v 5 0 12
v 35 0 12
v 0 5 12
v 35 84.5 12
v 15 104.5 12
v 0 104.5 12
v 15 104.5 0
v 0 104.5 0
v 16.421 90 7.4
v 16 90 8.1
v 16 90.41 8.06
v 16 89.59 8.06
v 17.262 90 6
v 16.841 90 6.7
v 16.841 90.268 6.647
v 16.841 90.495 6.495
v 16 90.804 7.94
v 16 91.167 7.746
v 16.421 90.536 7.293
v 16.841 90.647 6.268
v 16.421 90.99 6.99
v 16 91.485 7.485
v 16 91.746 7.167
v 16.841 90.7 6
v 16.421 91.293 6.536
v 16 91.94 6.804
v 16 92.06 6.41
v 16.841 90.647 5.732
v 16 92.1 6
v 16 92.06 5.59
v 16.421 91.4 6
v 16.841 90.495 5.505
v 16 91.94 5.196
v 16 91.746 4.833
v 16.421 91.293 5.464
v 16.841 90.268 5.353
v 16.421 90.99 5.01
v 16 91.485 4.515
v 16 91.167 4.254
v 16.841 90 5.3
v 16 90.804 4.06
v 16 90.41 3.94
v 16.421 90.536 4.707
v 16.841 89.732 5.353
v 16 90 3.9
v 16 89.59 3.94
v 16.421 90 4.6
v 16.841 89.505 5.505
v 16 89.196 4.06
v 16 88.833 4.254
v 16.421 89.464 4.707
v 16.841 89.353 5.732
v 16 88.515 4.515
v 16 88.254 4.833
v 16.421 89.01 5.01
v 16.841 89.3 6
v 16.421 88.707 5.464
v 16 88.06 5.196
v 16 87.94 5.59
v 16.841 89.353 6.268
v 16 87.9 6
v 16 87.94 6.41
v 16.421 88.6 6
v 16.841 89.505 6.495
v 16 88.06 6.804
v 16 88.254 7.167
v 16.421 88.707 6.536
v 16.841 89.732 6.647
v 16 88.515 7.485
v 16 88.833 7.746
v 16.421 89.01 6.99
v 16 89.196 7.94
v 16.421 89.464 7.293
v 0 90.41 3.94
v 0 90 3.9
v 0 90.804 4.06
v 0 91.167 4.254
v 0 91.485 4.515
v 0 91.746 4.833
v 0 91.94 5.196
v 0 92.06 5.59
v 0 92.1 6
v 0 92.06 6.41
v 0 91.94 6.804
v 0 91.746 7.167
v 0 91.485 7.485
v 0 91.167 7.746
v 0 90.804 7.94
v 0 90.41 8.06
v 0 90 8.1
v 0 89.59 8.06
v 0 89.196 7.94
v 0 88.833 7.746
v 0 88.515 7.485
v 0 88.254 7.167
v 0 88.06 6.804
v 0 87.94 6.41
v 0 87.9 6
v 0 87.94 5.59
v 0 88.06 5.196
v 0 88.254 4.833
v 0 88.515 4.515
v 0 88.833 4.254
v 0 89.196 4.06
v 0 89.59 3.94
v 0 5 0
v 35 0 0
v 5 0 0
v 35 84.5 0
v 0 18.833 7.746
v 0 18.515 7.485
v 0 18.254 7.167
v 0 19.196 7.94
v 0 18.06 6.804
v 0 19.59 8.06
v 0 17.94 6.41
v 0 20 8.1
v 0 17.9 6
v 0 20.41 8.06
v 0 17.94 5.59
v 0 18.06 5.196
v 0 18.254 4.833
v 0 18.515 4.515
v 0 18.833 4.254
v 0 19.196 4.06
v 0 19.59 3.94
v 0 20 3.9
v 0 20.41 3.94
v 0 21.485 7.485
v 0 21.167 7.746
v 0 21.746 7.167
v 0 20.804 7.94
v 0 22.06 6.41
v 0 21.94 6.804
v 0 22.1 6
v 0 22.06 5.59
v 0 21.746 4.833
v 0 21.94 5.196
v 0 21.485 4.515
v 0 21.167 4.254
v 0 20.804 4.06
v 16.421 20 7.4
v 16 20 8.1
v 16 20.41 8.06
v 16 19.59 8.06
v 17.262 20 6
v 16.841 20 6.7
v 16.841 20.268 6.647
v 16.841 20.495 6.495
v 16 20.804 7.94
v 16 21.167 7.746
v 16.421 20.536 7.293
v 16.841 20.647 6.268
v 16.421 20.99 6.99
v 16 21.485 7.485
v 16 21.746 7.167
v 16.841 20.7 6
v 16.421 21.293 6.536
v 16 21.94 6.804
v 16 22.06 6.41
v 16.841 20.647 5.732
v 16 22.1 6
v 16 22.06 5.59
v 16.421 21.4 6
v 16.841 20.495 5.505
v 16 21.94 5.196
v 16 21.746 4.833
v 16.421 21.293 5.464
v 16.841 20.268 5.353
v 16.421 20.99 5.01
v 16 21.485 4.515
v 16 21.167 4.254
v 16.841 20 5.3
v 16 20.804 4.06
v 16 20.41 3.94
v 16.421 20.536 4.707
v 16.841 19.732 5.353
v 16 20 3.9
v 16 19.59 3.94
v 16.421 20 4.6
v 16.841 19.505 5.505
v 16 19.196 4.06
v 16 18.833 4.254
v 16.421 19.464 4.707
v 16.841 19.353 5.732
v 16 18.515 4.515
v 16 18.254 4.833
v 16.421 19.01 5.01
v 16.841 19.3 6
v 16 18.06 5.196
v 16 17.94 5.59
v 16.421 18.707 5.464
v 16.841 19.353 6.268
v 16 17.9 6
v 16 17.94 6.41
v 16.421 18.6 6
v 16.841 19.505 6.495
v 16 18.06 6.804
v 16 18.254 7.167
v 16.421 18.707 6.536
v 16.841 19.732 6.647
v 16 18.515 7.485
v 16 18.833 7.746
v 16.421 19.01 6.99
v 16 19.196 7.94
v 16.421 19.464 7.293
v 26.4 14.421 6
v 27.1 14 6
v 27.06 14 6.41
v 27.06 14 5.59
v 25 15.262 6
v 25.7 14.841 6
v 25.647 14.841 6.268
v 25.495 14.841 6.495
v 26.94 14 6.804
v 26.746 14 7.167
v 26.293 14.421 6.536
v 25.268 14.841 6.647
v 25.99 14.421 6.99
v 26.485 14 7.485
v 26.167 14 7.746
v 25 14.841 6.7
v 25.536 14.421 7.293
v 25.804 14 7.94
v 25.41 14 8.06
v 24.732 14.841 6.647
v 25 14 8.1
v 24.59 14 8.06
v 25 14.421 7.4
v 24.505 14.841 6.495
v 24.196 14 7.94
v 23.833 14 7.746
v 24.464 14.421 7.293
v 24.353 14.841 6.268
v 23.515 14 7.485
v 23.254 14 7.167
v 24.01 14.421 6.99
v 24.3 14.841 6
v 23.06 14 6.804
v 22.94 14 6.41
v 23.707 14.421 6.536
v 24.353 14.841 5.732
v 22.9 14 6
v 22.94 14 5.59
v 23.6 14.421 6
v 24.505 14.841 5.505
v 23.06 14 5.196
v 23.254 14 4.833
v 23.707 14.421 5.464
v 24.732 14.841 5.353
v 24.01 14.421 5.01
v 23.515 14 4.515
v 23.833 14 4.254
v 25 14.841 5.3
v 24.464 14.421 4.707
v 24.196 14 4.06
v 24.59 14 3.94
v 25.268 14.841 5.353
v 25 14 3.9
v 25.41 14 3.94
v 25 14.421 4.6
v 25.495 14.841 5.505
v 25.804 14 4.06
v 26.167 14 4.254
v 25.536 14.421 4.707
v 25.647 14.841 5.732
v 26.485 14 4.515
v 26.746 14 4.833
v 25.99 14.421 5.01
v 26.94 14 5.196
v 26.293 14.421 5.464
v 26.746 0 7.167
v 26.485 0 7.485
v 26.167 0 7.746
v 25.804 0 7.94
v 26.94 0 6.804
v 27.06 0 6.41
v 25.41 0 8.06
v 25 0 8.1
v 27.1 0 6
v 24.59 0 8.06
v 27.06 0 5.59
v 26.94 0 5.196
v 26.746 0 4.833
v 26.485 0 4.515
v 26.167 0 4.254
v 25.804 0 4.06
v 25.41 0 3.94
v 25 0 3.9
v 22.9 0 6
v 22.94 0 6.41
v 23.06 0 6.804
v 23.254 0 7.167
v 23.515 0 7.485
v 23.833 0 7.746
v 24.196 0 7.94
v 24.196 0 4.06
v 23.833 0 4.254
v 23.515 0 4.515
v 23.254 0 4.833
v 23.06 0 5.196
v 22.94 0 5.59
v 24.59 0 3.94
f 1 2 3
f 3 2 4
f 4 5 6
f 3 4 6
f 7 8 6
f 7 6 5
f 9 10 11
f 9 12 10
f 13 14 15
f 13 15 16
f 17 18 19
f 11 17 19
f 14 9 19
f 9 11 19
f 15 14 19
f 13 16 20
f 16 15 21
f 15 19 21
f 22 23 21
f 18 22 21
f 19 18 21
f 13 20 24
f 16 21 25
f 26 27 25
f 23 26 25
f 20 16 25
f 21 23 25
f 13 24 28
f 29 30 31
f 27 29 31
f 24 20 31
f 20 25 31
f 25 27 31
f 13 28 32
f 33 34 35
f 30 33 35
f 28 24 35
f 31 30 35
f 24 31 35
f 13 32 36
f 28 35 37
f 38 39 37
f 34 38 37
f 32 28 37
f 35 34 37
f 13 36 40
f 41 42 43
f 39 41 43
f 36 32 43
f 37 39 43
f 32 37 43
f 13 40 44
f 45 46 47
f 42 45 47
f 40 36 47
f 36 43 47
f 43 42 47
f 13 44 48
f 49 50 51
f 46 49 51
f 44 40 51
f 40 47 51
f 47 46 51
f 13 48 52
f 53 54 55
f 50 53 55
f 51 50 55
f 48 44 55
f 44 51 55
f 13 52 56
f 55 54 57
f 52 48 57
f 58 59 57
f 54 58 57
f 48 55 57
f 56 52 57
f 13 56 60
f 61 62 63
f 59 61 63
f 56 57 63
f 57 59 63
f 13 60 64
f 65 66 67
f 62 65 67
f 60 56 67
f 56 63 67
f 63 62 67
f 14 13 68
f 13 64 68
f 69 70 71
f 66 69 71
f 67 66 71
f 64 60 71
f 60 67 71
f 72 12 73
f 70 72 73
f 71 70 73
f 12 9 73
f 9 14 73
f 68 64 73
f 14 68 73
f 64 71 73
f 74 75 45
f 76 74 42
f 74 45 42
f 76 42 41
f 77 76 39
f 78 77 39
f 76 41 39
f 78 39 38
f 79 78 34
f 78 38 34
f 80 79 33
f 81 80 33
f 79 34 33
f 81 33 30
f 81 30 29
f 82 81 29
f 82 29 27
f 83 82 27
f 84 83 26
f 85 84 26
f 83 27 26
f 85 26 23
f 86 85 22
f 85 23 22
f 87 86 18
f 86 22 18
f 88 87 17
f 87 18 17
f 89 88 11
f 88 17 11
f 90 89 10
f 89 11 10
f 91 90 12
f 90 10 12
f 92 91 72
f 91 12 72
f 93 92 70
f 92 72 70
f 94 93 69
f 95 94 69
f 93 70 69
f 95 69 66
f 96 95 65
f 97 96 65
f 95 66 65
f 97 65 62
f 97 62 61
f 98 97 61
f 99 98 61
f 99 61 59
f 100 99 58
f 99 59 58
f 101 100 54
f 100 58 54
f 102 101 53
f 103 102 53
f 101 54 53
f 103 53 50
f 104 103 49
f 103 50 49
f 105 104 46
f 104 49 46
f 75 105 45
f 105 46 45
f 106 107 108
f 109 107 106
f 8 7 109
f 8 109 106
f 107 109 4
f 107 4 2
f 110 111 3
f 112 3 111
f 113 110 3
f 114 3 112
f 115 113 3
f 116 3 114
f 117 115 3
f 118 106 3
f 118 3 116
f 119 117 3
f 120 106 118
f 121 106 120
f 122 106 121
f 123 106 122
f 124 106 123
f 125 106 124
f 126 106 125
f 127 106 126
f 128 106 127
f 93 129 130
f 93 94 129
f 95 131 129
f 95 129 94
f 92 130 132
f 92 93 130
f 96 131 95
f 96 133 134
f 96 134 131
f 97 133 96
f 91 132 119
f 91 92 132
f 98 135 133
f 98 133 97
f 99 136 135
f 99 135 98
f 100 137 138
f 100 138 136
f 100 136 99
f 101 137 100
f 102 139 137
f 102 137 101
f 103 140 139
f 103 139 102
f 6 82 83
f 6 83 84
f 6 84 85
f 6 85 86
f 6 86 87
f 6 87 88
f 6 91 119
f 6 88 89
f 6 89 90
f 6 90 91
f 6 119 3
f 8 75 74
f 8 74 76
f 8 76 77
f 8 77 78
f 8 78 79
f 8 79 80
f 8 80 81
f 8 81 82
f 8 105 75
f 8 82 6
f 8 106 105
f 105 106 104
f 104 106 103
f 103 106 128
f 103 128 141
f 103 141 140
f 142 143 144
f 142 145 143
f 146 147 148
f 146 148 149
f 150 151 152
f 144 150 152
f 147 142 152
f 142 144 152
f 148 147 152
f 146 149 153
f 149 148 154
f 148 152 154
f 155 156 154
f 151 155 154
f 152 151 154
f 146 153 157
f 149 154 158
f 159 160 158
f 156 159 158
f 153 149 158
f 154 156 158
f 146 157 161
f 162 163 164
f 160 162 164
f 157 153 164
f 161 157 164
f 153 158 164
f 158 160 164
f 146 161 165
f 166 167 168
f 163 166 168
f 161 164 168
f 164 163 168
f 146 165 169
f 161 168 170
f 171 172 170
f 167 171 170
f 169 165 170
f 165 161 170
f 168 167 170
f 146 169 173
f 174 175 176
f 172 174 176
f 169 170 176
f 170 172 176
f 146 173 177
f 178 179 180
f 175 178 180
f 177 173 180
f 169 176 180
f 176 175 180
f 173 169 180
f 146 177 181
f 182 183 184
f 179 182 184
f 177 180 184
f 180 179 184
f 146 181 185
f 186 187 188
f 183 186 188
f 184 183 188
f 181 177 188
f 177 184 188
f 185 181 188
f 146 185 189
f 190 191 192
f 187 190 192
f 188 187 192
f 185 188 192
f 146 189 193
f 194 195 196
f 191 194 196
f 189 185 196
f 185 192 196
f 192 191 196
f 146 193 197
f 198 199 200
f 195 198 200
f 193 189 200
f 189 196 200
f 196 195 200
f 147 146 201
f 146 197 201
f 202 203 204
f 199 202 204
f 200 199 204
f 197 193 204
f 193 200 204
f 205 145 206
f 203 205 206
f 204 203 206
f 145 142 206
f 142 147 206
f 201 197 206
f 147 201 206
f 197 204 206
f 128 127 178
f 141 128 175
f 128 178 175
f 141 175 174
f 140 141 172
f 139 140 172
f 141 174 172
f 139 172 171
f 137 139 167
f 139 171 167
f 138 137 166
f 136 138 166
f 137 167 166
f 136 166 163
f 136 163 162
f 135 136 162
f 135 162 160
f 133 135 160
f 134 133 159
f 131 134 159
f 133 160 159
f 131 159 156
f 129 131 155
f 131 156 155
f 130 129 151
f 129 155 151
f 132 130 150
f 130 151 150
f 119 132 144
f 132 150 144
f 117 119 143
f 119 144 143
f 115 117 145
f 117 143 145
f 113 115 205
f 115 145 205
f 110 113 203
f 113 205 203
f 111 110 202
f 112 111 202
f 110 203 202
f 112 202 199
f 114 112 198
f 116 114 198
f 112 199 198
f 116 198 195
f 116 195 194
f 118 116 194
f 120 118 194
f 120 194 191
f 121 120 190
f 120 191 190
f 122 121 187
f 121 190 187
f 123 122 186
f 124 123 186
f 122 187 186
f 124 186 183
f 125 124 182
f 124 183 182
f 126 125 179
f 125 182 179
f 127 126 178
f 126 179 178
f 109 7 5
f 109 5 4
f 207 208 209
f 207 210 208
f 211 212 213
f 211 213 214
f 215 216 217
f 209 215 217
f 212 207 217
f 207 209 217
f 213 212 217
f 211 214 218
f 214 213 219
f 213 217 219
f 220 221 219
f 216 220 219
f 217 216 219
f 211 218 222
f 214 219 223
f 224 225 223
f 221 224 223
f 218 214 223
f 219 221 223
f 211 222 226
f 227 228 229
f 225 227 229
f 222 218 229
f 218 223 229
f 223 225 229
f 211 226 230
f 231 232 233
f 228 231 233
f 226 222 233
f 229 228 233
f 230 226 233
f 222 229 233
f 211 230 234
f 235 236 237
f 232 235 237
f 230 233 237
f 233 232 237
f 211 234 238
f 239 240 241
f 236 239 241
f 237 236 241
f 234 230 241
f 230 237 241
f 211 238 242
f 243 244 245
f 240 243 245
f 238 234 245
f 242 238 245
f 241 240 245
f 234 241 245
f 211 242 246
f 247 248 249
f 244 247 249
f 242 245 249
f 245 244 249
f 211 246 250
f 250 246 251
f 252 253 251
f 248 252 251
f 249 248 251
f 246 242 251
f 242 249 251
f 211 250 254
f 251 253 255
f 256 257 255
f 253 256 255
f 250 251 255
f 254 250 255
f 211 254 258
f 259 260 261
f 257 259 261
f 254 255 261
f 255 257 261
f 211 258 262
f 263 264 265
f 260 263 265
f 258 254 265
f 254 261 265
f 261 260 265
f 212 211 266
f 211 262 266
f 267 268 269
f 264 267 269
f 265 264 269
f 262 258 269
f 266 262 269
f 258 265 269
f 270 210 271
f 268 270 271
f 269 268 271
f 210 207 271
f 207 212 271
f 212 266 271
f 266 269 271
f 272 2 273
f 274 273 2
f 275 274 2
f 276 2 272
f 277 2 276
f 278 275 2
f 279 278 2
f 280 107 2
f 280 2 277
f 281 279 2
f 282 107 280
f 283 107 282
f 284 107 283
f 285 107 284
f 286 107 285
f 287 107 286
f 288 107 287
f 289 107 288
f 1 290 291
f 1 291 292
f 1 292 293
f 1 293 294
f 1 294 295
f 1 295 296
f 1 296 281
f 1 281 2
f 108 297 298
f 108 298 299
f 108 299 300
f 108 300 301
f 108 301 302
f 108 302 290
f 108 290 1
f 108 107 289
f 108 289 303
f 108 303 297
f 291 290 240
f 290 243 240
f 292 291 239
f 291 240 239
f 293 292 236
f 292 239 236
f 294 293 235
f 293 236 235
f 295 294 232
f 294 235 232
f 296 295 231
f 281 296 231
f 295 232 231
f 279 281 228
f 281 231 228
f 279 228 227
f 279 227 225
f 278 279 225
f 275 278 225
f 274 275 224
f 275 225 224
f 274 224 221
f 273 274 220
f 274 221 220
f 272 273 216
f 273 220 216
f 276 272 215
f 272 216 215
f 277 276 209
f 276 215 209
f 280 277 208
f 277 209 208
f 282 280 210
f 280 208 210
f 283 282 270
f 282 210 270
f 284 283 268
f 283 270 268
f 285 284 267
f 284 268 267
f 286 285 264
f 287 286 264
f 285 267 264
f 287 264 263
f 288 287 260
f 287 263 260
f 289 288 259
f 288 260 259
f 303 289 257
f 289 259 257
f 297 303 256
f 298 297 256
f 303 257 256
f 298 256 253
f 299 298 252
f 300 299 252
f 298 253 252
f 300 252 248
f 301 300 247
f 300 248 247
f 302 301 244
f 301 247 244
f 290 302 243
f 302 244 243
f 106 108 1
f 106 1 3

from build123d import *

# Parameters (mm, degrees)
BOSS_EXTRUDE1_DEPTH       = 12
M5X0_8_TAPPED_HOLE1_D     = 4.2
M5X0_8_TAPPED_HOLE1_DEPTH = 16
M5X0_8_TAPPED_HOLE1_TIP   = 1.2618073
M5X0_8_TAPPED_HOLE2_D     = 4.2
M5X0_8_TAPPED_HOLE2_DEPTH = 14
M5X0_8_TAPPED_HOLE2_TIP   = 1.2618073


with BuildPart() as part:
    # Sketch1 → Boss-Extrude1 (new body)
    with BuildSketch(Plane.XY):
        Polygon((15, 104.5), (35, 84.5), (35, 0), (5, 0), (0, 5), (0, 104.5), align=None)
    extrude(amount=BOSS_EXTRUDE1_DEPTH)

    # M5x0.8 Tapped Hole1
    with Locations(Plane.ZY):
        with Locations((6, 90), (6, 20)):
            Hole(M5X0_8_TAPPED_HOLE1_D / 2, depth=M5X0_8_TAPPED_HOLE1_DEPTH)
            with Locations((0, 0, -(M5X0_8_TAPPED_HOLE1_DEPTH + M5X0_8_TAPPED_HOLE1_TIP / 2))):  # 118° drill point
                Cone(0, M5X0_8_TAPPED_HOLE1_D / 2, M5X0_8_TAPPED_HOLE1_TIP, mode=Mode.SUBTRACT)

    # M5x0.8 Tapped Hole2
    with Locations(Plane.XZ):
        with Locations((25, 6)):
            Hole(M5X0_8_TAPPED_HOLE2_D / 2, depth=M5X0_8_TAPPED_HOLE2_DEPTH)
            with Locations((0, 0, -(M5X0_8_TAPPED_HOLE2_DEPTH + M5X0_8_TAPPED_HOLE2_TIP / 2))):  # 118° drill point
                Cone(0, M5X0_8_TAPPED_HOLE2_D / 2, M5X0_8_TAPPED_HOLE2_TIP, mode=Mode.SUBTRACT)


solid = part.part
